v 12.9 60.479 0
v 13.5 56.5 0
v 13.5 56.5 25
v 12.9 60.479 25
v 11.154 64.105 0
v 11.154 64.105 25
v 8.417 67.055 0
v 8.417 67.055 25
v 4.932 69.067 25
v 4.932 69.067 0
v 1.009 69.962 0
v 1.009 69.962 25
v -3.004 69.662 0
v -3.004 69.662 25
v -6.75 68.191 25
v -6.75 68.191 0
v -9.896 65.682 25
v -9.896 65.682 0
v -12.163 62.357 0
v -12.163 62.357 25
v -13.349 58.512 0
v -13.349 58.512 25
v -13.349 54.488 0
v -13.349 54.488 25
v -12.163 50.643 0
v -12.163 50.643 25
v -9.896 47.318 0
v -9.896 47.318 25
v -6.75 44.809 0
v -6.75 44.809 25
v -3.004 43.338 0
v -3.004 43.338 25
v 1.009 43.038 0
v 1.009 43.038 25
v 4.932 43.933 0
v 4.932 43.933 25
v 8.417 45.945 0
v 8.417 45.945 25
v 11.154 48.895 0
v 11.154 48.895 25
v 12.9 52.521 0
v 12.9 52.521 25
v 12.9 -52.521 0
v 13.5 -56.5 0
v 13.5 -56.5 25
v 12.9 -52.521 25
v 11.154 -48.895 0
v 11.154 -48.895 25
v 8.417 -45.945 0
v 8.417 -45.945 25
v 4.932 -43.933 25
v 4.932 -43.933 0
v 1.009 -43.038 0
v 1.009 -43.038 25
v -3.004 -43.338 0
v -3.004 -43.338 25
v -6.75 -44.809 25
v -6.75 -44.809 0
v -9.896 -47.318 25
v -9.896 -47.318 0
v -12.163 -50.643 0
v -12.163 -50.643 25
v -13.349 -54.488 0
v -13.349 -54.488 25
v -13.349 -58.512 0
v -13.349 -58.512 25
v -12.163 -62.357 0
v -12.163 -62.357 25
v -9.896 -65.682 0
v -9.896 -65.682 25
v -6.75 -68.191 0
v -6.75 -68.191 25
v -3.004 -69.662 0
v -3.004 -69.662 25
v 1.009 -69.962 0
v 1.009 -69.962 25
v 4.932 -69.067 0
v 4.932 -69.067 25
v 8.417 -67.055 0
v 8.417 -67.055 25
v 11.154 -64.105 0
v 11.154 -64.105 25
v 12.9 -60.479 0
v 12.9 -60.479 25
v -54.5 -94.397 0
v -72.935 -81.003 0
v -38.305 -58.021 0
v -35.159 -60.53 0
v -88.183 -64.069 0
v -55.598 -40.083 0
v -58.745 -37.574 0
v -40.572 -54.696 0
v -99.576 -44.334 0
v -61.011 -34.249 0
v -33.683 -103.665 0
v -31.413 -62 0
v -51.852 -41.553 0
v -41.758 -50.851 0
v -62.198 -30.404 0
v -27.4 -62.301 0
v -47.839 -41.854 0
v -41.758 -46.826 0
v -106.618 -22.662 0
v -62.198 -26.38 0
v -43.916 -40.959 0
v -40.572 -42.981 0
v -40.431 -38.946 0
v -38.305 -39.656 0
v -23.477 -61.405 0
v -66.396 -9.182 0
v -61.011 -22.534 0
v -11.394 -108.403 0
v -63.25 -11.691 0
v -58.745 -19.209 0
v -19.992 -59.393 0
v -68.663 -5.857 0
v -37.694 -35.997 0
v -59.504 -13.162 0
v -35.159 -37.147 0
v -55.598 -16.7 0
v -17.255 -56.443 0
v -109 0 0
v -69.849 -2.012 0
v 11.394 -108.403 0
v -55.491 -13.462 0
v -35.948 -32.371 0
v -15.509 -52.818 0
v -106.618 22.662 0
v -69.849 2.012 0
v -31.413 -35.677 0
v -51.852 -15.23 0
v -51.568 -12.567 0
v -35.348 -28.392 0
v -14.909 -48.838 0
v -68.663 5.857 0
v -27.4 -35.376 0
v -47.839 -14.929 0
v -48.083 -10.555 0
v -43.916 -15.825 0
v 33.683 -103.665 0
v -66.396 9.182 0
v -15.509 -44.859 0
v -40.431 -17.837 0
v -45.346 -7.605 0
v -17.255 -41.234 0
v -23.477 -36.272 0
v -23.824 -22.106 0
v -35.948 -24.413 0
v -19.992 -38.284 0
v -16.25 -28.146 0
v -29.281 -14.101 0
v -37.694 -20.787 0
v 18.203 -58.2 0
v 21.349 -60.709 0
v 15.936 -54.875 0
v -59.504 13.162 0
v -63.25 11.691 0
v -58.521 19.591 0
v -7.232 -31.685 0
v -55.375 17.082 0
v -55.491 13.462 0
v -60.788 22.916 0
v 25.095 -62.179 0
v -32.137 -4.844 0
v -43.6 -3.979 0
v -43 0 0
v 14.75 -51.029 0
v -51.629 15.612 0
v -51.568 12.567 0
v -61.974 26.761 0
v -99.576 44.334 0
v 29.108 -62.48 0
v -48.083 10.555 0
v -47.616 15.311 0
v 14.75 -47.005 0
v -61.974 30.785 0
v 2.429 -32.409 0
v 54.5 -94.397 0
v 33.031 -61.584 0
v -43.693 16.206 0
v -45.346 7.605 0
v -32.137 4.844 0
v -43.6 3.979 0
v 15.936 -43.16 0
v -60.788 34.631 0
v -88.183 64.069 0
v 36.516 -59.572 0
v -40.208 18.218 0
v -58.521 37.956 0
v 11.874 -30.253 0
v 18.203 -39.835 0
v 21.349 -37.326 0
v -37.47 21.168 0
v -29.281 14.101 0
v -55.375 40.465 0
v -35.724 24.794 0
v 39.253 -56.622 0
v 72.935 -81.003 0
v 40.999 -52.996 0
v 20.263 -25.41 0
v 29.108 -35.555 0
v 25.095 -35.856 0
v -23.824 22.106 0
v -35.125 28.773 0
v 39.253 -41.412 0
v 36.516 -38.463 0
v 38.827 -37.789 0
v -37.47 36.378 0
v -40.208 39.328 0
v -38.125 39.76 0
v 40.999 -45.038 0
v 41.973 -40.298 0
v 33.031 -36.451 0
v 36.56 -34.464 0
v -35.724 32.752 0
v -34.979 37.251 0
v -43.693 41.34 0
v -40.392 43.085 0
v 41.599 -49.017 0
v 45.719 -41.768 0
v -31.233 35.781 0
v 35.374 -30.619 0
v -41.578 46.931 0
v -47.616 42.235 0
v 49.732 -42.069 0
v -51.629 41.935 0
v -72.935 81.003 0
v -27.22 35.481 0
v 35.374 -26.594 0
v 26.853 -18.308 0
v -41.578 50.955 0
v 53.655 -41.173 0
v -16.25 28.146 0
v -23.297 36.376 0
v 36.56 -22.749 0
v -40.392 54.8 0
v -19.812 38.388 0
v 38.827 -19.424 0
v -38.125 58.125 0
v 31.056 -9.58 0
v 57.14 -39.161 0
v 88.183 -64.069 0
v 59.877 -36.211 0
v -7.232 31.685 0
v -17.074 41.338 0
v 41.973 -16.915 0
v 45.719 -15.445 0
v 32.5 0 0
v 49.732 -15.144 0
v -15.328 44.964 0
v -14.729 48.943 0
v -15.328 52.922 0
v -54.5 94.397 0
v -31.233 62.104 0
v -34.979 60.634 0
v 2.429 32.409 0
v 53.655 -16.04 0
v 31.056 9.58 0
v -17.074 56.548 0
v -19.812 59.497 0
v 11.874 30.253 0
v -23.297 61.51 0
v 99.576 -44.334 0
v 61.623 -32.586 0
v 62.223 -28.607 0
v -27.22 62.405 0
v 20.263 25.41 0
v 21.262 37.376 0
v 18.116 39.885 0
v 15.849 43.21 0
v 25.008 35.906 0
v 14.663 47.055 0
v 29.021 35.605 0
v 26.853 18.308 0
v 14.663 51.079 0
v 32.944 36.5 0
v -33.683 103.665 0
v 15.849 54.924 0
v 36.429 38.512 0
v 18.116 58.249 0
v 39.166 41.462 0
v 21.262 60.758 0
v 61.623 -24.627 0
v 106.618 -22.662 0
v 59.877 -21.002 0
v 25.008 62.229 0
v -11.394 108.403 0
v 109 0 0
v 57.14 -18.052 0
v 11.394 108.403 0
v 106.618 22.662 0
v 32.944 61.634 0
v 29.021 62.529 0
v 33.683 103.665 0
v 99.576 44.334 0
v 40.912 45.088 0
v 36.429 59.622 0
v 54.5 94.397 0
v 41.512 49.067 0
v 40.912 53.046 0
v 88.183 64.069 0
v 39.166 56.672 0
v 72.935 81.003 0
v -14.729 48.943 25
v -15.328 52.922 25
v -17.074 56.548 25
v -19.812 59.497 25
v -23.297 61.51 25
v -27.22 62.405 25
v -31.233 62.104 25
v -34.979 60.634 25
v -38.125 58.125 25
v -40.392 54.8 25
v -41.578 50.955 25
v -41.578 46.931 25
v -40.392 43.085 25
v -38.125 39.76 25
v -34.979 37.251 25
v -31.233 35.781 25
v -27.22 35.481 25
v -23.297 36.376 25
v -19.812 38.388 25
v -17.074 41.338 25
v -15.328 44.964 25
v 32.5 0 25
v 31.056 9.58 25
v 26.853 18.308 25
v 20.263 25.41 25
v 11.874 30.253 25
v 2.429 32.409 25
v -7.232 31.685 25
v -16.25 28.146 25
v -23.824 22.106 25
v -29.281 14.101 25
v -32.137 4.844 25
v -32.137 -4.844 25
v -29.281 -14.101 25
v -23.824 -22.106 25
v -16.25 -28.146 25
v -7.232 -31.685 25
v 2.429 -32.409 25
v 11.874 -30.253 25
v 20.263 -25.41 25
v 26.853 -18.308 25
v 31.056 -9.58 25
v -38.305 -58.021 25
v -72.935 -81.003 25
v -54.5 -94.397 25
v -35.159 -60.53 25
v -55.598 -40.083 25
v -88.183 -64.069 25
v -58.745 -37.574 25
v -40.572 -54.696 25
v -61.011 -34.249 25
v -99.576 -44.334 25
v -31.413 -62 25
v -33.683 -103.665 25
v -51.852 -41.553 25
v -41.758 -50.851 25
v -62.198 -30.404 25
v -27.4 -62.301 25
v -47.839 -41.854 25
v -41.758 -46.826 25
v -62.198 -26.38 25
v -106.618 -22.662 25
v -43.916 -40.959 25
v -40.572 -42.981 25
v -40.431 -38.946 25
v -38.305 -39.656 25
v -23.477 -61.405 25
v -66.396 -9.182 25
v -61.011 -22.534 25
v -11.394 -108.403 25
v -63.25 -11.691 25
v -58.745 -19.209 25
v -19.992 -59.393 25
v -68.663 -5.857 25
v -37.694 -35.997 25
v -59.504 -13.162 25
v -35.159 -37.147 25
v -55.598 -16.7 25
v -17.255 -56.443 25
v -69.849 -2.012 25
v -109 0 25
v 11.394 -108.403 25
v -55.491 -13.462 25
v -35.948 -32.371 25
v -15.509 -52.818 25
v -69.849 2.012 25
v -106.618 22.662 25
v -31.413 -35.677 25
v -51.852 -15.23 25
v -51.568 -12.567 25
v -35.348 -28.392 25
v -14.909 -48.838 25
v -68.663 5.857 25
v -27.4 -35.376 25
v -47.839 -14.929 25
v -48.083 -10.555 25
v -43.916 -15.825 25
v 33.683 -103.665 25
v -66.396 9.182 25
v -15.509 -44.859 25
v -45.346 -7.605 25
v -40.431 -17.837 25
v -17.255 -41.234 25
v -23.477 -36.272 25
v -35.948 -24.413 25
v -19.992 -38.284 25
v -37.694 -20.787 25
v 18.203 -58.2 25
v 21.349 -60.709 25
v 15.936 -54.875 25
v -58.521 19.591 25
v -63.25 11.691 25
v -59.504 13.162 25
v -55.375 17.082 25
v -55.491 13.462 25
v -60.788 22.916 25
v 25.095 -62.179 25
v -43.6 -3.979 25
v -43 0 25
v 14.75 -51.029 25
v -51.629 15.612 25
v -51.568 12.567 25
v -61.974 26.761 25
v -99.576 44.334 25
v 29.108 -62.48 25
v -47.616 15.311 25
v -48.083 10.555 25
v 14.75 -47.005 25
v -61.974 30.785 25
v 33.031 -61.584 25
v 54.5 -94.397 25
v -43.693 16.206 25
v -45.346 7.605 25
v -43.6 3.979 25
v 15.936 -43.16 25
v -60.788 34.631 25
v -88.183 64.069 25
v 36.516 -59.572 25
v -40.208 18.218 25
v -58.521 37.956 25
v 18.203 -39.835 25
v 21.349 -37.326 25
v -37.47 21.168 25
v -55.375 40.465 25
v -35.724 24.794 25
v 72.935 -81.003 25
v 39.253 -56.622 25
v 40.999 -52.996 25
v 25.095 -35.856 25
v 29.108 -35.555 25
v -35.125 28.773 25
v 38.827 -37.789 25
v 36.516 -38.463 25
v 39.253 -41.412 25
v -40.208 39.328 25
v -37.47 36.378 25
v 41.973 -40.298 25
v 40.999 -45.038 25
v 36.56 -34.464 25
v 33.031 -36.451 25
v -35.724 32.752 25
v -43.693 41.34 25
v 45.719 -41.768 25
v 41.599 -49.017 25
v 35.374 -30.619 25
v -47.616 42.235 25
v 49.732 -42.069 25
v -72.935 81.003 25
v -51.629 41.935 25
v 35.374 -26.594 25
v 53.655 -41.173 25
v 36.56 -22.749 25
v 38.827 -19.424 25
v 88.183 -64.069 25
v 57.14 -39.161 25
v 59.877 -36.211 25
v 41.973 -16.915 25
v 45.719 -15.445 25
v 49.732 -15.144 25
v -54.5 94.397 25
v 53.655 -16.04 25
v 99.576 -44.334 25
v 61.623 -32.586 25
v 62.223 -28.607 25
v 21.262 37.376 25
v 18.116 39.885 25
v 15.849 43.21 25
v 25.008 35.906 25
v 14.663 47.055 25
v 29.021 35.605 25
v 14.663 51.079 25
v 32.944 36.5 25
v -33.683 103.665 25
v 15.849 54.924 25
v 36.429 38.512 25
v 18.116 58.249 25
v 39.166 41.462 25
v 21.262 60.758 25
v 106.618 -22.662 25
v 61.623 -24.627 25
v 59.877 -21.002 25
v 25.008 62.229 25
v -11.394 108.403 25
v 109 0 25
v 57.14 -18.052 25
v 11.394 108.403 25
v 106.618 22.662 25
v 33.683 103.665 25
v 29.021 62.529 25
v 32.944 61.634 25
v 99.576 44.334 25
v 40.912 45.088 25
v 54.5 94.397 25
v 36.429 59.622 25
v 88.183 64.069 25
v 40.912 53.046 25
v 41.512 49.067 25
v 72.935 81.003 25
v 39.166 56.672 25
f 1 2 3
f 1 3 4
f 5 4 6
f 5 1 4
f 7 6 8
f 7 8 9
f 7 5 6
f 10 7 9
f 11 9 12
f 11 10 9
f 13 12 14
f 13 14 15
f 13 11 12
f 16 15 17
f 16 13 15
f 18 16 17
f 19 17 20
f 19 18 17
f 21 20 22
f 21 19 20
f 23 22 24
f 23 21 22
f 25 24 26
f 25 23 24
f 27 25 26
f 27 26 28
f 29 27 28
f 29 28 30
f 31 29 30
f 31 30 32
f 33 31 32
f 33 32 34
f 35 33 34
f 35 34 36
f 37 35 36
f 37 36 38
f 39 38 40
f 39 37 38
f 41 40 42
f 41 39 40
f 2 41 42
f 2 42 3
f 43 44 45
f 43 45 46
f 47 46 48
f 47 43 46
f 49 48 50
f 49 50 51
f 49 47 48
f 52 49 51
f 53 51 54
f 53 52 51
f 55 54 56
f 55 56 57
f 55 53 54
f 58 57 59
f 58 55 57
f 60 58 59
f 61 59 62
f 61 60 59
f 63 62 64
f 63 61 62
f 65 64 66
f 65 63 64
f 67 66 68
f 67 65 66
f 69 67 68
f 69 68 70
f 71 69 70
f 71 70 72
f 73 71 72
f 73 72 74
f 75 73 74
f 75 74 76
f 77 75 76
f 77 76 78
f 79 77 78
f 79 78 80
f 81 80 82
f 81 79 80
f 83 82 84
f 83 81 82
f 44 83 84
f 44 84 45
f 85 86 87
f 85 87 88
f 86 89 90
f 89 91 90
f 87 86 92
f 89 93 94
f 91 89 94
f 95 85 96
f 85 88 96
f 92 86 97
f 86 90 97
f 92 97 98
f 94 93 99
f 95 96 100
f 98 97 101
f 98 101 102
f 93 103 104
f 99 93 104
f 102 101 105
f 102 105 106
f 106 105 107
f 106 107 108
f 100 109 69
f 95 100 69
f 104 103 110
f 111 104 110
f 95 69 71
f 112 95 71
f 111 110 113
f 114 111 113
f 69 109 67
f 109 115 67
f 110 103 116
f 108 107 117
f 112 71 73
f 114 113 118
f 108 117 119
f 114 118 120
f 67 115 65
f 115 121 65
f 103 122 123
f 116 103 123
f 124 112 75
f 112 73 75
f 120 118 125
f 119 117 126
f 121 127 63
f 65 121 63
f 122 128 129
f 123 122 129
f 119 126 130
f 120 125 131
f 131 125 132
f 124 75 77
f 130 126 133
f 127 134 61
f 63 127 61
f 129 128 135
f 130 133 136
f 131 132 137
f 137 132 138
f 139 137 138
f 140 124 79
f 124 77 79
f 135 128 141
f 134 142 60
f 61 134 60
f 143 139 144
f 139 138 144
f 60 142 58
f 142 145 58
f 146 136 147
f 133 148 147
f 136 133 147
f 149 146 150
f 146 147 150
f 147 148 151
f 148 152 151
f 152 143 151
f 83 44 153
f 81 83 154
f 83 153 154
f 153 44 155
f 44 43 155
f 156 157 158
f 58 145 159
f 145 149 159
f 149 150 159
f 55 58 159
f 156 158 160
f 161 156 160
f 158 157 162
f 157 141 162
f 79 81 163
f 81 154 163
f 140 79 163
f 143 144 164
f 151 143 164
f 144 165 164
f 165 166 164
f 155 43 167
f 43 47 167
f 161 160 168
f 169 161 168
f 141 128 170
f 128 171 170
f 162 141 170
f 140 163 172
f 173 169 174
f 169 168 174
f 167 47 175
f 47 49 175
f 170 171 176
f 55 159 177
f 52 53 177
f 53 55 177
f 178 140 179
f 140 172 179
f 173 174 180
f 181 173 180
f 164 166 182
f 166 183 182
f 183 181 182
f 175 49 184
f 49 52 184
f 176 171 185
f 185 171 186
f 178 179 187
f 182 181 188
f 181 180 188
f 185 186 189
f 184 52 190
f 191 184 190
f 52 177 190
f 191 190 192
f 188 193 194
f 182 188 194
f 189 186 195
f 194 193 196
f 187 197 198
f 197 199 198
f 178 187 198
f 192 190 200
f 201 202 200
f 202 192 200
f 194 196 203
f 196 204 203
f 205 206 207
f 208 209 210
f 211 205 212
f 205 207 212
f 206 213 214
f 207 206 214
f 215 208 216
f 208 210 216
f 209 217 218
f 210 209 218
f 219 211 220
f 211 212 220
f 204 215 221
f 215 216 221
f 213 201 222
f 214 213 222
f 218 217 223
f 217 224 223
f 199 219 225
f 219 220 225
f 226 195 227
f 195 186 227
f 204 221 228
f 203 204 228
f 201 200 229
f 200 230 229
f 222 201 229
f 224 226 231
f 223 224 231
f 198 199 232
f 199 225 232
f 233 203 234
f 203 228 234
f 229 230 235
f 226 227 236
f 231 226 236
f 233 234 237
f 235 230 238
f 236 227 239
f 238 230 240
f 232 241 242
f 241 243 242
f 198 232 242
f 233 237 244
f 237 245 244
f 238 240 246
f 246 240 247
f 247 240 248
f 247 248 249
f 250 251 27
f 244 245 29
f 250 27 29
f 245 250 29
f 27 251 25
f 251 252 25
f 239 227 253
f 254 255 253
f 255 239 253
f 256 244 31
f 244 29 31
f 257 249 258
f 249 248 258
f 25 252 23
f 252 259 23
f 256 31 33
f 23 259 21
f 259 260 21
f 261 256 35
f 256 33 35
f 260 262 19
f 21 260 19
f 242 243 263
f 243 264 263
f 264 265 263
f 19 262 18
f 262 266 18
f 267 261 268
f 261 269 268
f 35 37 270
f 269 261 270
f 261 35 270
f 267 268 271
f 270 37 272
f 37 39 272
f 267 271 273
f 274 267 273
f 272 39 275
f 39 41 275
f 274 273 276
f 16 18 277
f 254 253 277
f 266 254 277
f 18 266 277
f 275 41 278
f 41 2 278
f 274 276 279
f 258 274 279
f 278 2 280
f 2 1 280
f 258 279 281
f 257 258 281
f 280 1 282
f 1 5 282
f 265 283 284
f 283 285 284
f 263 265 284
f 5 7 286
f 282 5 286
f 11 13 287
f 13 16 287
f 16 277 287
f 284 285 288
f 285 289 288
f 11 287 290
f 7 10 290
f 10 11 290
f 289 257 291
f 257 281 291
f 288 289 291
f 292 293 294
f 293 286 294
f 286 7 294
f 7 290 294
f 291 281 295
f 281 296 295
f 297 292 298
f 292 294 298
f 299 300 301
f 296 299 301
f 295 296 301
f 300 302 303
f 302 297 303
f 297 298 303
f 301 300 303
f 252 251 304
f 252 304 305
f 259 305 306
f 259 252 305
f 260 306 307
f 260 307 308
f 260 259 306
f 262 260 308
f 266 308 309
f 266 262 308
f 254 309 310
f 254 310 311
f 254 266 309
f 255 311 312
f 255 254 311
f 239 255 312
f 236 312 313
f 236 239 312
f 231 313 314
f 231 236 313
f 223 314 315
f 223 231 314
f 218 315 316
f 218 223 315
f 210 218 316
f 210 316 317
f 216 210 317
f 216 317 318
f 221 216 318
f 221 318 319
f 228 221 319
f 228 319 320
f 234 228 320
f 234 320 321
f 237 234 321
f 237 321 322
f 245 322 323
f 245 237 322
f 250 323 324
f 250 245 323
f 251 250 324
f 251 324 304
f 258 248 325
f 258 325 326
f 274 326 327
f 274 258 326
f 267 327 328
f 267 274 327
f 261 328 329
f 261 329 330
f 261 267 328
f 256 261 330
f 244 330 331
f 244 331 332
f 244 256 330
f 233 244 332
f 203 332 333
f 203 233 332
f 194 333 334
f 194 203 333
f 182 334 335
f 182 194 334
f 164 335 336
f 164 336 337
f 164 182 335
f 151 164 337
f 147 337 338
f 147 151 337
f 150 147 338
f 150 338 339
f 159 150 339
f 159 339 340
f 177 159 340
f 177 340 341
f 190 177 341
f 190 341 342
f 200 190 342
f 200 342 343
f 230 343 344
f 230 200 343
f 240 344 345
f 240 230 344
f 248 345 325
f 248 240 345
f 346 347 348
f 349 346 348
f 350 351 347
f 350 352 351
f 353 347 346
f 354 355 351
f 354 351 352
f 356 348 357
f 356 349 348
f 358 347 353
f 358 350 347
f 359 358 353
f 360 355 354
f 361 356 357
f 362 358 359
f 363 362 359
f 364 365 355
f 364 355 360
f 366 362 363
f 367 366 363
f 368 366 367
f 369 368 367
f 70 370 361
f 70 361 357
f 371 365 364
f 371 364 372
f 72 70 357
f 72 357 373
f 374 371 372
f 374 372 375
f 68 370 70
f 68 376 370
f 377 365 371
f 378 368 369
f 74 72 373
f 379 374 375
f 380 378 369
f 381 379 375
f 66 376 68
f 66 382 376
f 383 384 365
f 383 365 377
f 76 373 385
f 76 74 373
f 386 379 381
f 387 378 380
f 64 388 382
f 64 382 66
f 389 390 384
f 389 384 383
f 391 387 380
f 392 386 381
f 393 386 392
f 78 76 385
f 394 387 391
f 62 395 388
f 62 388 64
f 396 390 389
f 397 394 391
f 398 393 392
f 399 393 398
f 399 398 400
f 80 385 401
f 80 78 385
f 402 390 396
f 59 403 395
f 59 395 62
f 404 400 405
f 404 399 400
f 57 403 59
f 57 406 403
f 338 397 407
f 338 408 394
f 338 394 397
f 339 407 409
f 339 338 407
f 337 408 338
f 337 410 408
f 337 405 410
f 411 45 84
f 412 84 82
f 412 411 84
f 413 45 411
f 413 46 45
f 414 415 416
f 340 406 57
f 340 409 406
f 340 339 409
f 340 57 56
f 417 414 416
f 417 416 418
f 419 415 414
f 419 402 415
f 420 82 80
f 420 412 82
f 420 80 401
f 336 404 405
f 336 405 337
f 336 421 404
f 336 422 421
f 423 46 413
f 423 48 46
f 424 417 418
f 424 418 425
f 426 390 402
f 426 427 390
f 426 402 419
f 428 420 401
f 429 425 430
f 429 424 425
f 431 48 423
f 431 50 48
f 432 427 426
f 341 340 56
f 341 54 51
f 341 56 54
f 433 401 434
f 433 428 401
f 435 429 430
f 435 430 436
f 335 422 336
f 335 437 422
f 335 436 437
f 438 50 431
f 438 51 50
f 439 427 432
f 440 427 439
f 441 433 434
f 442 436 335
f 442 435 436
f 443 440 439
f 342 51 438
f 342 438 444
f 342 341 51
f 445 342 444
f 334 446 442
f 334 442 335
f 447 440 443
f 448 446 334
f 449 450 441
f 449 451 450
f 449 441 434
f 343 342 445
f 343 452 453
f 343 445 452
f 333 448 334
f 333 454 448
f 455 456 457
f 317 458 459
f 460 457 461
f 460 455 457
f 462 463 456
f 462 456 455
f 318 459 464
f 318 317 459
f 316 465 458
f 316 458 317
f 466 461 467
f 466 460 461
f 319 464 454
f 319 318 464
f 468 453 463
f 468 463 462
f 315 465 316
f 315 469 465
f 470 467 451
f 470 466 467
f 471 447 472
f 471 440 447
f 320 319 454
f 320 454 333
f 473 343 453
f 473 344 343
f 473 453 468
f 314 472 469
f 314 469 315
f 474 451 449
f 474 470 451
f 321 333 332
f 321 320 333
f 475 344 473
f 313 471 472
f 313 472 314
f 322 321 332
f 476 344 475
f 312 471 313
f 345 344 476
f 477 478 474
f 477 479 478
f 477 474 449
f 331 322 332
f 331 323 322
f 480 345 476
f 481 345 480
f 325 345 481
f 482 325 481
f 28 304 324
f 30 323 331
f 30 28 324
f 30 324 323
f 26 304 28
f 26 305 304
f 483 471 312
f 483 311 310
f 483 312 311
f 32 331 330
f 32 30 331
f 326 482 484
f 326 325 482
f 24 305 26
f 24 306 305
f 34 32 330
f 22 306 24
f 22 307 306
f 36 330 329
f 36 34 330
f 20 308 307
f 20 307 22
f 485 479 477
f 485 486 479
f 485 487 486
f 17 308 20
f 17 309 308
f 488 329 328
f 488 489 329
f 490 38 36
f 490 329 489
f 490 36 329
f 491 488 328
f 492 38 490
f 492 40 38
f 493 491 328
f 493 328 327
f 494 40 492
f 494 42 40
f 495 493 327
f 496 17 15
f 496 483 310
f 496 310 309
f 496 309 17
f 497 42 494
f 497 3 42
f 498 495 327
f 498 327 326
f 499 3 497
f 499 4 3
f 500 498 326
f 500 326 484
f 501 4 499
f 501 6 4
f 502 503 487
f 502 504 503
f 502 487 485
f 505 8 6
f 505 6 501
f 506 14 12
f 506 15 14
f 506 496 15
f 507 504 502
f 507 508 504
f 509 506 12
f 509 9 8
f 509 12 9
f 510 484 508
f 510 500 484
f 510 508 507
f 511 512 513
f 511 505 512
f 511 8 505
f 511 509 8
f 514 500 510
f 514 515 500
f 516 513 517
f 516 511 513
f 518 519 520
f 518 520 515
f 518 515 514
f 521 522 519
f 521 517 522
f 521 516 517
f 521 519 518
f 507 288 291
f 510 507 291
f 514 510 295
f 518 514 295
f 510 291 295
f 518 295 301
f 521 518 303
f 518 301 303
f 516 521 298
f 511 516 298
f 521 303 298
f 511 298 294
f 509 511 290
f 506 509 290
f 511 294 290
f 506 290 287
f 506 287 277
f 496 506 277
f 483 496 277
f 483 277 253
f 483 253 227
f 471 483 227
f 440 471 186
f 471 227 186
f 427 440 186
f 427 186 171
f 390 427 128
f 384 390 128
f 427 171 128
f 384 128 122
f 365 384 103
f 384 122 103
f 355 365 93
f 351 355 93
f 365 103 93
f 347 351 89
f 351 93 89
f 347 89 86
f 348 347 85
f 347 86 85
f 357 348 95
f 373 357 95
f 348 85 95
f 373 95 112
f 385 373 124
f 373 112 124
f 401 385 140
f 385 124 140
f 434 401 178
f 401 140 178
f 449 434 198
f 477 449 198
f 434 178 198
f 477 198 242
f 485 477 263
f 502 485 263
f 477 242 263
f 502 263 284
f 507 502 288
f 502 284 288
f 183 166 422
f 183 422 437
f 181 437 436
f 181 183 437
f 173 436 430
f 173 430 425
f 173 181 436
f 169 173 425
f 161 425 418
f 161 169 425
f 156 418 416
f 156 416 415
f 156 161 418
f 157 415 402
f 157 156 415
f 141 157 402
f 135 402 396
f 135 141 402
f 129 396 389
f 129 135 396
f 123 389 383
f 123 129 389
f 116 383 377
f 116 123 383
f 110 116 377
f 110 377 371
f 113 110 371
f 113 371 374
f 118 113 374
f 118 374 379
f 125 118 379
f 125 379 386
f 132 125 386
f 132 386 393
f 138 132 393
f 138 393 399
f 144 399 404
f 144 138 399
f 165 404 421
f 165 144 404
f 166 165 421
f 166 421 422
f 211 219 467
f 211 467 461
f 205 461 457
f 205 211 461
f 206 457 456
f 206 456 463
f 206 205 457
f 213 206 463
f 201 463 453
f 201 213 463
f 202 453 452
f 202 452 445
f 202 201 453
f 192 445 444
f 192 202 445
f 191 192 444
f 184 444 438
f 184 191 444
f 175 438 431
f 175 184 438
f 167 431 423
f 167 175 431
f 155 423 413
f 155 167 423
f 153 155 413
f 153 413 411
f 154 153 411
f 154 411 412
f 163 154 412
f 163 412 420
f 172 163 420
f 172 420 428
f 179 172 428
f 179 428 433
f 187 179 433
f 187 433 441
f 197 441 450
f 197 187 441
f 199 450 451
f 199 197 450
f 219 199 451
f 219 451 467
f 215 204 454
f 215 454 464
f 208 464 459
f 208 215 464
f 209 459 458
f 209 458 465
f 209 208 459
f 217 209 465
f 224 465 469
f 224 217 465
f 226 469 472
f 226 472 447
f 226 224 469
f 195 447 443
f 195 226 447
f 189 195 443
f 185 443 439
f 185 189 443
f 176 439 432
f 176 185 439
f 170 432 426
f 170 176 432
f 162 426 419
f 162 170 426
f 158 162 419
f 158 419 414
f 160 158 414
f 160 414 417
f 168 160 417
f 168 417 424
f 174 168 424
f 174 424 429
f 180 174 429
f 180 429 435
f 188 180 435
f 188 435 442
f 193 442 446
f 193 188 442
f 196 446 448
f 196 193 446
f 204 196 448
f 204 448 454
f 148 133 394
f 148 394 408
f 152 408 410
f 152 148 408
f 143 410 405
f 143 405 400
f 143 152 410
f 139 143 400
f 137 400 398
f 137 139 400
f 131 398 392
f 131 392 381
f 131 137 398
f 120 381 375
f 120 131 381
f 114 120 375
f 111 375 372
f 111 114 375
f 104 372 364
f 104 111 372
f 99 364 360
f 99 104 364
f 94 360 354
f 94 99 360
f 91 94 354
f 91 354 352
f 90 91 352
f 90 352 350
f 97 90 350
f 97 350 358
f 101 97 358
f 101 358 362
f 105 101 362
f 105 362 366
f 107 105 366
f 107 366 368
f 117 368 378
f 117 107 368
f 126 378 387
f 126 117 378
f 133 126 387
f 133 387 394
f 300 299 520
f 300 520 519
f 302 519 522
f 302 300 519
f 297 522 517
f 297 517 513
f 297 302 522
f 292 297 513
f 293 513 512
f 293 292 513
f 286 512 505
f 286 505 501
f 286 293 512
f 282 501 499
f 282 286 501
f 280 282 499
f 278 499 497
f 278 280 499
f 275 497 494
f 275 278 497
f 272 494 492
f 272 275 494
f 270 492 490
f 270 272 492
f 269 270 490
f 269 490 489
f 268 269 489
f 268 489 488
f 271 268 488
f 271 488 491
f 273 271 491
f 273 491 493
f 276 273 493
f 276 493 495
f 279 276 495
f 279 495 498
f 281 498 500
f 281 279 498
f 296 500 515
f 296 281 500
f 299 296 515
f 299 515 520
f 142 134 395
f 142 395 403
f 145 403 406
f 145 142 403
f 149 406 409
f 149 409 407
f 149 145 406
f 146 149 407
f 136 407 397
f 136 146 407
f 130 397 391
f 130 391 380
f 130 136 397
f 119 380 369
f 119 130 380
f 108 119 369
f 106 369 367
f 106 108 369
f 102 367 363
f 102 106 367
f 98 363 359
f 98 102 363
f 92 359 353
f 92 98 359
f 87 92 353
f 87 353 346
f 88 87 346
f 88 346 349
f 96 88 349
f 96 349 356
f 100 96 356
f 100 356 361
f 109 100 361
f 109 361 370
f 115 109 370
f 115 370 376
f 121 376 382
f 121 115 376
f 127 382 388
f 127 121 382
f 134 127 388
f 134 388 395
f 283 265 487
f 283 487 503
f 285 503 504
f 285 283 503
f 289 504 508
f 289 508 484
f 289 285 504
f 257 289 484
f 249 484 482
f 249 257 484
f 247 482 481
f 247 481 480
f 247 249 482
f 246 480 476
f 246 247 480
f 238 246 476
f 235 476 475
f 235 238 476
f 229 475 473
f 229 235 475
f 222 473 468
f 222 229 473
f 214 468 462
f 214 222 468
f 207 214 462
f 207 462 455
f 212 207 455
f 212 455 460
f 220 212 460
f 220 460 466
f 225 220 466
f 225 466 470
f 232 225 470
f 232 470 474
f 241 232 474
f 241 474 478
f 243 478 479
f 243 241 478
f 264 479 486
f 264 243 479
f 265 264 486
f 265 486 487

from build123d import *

# Parameters (mm, degrees)
F0_R     = 109
F0_R_2   = 75
F0_R_3   = 13.5
F0_R_4   = 37.5
F0_R_5   = 32.5
F1_DEPTH = 25


with BuildPart() as f1:
    # F0 (on Top) → F1 (new body)
    with BuildSketch(Plane.XY):
        Circle(F0_R)
        Circle(F0_R_2, mode=Mode.SUBTRACT)
        Circle(F0_R_2)
        with Locations((-28.408734, -48.838446)):
            Circle(F0_R_3, mode=Mode.SUBTRACT)
        with Locations((-48.848327, -28.391741)):
            Circle(F0_R_3, mode=Mode.SUBTRACT)
        with Locations((0, -56.5)):
            Circle(F0_R_3, mode=Mode.SUBTRACT)
        with Locations((28.099003, -49.017303)):
            Circle(F0_R_3, mode=Mode.SUBTRACT)
        with Locations((48.722864, -28.606512)):
            Circle(F0_R_3, mode=Mode.SUBTRACT)
        with Locations((-56.5, 0)):
            Circle(F0_R_3, mode=Mode.SUBTRACT)
        with Locations((-48.624626, 28.773177)):
            Circle(F0_R_3, mode=Mode.SUBTRACT)
        with Locations((-28.228625, 48.94277)):
            Circle(F0_R_3, mode=Mode.SUBTRACT)
        Circle(F0_R_4, mode=Mode.SUBTRACT)
        with Locations((28.012047, 49.067048)):
            Circle(F0_R_3, mode=Mode.SUBTRACT)
        with Locations((0, 56.5)):
            Circle(F0_R_3, mode=Mode.SUBTRACT)
        Circle(F0_R_4)
        Circle(F0_R_5, mode=Mode.SUBTRACT)
    extrude(amount=F1_DEPTH)


solid = f1.part
